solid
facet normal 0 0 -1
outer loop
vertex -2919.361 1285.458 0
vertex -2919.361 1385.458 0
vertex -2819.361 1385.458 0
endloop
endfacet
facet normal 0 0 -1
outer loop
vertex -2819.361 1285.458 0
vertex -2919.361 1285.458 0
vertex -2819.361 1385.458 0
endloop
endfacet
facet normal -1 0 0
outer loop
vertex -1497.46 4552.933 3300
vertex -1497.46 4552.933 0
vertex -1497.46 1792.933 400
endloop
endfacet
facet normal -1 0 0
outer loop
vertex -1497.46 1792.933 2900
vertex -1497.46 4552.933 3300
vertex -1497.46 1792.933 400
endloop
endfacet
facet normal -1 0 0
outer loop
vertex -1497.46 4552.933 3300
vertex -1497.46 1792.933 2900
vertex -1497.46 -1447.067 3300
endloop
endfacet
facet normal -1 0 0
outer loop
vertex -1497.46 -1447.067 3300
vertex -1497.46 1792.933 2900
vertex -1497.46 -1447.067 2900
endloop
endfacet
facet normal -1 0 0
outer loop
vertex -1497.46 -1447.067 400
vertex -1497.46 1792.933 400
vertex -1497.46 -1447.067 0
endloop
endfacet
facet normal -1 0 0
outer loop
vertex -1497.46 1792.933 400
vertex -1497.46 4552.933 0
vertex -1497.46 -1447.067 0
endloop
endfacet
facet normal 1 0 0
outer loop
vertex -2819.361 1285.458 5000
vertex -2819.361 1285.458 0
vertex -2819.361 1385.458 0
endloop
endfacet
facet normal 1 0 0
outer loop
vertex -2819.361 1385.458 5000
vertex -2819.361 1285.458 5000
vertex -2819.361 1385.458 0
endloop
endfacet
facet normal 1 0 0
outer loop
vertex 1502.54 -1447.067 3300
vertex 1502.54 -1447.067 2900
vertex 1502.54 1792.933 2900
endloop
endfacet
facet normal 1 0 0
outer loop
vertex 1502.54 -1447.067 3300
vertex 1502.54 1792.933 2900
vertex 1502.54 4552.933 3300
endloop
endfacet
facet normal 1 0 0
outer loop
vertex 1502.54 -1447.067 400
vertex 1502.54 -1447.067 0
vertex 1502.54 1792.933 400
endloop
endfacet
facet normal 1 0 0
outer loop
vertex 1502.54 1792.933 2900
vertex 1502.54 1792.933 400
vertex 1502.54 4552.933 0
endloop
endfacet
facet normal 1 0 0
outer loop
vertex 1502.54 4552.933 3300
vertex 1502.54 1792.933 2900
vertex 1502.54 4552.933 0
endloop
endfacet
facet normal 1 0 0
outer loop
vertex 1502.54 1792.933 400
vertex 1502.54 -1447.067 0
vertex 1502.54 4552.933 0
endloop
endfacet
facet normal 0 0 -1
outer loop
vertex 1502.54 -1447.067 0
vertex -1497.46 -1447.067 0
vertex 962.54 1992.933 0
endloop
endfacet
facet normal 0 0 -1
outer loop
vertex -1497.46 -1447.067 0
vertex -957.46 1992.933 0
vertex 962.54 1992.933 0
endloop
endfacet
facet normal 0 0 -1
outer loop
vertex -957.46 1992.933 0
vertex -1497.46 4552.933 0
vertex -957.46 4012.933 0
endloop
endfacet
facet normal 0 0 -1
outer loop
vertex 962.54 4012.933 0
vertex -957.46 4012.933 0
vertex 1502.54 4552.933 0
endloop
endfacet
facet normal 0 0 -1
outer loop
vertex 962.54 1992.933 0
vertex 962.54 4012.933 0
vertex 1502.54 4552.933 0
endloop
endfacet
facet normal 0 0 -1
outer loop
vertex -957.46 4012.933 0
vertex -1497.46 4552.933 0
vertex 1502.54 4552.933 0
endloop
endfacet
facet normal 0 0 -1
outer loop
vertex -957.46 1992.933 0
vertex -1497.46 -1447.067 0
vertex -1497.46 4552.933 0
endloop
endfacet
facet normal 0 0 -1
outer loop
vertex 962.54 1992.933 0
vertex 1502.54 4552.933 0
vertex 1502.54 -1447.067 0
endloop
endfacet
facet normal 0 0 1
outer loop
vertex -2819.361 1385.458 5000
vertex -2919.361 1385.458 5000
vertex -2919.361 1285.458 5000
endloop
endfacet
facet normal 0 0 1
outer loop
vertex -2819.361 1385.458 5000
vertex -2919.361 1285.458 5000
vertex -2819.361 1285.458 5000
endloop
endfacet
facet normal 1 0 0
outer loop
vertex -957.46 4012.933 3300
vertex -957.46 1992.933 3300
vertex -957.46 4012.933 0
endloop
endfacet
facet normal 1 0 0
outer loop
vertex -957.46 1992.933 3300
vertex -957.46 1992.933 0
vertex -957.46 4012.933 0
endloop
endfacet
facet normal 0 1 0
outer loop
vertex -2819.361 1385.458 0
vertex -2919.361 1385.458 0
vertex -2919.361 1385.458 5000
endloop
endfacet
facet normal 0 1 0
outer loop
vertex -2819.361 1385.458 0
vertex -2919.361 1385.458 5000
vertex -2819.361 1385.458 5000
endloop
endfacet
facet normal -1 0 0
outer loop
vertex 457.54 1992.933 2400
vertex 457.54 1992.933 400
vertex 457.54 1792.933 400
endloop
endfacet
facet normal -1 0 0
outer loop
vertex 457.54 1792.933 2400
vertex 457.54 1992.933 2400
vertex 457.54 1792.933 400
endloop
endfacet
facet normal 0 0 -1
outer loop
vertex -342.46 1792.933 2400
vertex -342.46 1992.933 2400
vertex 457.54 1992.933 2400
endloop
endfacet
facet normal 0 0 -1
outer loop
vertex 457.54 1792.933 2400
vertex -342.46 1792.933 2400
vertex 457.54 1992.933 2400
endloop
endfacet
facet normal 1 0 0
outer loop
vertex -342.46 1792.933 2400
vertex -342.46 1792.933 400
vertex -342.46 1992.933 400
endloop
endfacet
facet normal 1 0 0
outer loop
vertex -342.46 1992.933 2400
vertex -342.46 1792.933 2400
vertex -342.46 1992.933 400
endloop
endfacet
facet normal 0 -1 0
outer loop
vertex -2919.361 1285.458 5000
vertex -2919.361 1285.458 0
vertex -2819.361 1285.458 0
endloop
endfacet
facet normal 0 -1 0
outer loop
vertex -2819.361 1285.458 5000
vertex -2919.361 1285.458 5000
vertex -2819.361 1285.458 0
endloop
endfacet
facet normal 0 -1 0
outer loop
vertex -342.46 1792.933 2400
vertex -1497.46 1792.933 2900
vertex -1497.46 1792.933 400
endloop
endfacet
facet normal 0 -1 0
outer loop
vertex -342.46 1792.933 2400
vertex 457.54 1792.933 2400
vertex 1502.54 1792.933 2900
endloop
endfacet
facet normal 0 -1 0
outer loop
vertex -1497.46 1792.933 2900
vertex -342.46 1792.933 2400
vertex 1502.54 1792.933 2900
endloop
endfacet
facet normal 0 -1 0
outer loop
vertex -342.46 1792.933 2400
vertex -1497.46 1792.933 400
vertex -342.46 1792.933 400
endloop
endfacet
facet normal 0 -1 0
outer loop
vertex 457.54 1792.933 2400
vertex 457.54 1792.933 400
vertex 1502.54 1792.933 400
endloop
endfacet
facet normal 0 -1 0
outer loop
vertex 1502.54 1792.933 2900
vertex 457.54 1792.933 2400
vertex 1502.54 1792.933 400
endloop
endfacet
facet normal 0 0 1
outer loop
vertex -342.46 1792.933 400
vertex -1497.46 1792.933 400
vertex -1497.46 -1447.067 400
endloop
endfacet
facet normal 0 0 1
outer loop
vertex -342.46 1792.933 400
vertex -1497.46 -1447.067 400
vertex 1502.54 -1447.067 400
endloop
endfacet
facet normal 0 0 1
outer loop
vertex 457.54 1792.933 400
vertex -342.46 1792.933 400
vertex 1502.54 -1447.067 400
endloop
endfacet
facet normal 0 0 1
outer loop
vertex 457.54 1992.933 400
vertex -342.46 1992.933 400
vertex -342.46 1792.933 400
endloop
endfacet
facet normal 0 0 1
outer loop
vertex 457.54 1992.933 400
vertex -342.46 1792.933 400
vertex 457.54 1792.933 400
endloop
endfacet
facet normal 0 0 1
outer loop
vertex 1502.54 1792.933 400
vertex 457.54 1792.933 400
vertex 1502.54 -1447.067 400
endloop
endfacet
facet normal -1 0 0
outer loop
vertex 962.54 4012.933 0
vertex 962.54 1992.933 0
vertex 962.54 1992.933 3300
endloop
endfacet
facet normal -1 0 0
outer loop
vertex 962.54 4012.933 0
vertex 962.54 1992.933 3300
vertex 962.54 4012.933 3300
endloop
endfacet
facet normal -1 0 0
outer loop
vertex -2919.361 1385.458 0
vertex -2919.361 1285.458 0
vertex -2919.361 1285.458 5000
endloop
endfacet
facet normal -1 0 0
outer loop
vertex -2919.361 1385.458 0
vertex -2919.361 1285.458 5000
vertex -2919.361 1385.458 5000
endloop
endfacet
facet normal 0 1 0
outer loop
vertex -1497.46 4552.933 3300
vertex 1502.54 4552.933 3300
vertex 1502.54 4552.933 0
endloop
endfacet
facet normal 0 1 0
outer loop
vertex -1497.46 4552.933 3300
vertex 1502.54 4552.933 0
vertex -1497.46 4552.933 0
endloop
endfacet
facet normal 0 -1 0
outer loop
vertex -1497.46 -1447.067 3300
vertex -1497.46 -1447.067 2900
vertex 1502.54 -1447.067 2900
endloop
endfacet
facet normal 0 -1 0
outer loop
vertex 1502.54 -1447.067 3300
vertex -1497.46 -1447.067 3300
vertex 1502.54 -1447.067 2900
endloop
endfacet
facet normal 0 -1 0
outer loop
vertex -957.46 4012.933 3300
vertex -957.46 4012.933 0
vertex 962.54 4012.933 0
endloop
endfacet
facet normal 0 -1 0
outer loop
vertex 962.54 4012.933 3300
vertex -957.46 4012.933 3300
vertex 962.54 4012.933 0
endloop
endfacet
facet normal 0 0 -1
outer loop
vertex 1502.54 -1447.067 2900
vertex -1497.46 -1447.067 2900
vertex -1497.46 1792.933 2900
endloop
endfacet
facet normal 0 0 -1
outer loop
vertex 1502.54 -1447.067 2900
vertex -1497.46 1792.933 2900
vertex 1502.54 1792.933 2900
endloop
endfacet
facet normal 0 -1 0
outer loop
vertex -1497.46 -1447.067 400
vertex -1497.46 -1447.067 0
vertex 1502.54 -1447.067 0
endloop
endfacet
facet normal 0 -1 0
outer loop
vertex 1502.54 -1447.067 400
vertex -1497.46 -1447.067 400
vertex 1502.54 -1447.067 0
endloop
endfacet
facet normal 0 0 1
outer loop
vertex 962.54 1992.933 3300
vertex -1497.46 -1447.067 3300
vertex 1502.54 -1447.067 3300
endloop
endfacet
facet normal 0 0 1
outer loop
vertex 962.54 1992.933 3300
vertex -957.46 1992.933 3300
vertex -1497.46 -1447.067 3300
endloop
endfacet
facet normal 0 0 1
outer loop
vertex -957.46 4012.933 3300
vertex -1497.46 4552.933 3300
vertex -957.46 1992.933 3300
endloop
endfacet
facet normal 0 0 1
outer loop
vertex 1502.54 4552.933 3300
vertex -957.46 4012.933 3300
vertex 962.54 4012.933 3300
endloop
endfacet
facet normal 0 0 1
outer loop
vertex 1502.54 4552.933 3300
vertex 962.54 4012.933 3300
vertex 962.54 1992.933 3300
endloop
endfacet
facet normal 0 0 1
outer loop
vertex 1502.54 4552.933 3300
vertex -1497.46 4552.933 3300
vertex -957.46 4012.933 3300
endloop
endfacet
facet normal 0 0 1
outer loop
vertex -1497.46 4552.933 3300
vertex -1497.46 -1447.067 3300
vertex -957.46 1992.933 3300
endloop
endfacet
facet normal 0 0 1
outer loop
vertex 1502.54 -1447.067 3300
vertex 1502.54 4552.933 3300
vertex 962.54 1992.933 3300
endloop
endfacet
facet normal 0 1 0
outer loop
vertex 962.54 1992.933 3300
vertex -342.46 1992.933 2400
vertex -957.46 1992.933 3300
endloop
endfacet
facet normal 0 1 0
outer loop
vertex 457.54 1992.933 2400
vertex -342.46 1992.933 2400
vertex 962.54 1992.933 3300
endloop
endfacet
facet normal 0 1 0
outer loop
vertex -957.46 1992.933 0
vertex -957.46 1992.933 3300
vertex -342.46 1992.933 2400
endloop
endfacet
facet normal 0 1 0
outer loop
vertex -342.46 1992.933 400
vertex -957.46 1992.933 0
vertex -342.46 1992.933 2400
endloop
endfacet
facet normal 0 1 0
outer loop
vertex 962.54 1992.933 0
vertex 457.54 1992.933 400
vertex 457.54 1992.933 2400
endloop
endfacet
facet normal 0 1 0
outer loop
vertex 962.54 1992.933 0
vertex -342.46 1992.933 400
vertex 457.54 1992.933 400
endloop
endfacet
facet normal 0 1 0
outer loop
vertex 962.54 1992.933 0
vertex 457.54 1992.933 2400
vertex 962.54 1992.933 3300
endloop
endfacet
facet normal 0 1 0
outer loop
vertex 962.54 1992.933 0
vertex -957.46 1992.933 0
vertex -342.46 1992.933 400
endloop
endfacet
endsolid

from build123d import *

# Parameters (mm, degrees)
F0_W     = 3000
F0_H     = 6000
F0_W_2   = 1920
F0_H_2   = 2020
F1_DEPTH = 400
F3_DEPTH = 2000
F4_W     = 3000
F4_H     = 2760
F4_W_2   = 1920
F4_H_2   = 2020
F5_DEPTH = 500
F6_W     = 1920
F6_H     = 2020
F7_DEPTH = 400
F8_W     = 100
F8_H     = 100
F9_DEPTH = 5000


with BuildPart() as f1:
    # F0 (on Top) → F1 (new body)
    with BuildSketch(Plane.XY):
        with Locations((2.540326, 1552.932938)):
            Rectangle(F0_W, F0_H)
        with Locations((2.540326, 3002.932938)):
            Rectangle(F0_W_2, F0_H_2, mode=Mode.SUBTRACT)
    extrude(amount=F1_DEPTH)

    # F2 (on face) → F3 (join)
    with BuildSketch(Plane.XY.offset(400)):
        Polygon((1502.540326, 4552.932938), (-1497.459674, 4552.932938), (-1497.459674, 1792.932938), (-342.459674, 1792.932938), (-342.459674, 1992.932938), (-957.459674, 1992.932938), (-957.459674, 4012.932938), (962.540326, 4012.932938), (962.540326, 1992.932938), (457.540326, 1992.932938), (457.540326, 1792.932938), (1502.540326, 1792.932938), align=None)
    extrude(amount=F3_DEPTH)

    # F4 (on face) → F5 (join)
    with BuildSketch(Plane.XY.offset(2400)):
        with Locations((2.540326, 3172.932938)):
            Rectangle(F4_W, F4_H)
        with Locations((2.540326, 3002.932938)):
            Rectangle(F4_W_2, F4_H_2, mode=Mode.SUBTRACT)
    extrude(amount=F5_DEPTH)

    # F6 (on face) → F7 (join)
    with BuildSketch(Plane.XY.offset(2900)):
        Polygon((1502.540326, 4552.932938), (-1497.459674, 4552.932938), (-1497.459674, 1792.932938), (-1497.459674, -1447.067062), (1502.540326, -1447.067062), (1502.540326, 1792.932938), align=None)
        with Locations((2.540326, 3002.932938)):
            Rectangle(F6_W, F6_H, mode=Mode.SUBTRACT)
    extrude(amount=F7_DEPTH)


with BuildPart() as f9:
    # F8 (on Top) → F9 (new body)
    with BuildSketch(Plane.XY):
        with Locations((-2869.361162, 1335.457803)):
            Rectangle(F8_W, F8_H)
    extrude(amount=F9_DEPTH)


solid = Compound([f1.part, f9.part])
